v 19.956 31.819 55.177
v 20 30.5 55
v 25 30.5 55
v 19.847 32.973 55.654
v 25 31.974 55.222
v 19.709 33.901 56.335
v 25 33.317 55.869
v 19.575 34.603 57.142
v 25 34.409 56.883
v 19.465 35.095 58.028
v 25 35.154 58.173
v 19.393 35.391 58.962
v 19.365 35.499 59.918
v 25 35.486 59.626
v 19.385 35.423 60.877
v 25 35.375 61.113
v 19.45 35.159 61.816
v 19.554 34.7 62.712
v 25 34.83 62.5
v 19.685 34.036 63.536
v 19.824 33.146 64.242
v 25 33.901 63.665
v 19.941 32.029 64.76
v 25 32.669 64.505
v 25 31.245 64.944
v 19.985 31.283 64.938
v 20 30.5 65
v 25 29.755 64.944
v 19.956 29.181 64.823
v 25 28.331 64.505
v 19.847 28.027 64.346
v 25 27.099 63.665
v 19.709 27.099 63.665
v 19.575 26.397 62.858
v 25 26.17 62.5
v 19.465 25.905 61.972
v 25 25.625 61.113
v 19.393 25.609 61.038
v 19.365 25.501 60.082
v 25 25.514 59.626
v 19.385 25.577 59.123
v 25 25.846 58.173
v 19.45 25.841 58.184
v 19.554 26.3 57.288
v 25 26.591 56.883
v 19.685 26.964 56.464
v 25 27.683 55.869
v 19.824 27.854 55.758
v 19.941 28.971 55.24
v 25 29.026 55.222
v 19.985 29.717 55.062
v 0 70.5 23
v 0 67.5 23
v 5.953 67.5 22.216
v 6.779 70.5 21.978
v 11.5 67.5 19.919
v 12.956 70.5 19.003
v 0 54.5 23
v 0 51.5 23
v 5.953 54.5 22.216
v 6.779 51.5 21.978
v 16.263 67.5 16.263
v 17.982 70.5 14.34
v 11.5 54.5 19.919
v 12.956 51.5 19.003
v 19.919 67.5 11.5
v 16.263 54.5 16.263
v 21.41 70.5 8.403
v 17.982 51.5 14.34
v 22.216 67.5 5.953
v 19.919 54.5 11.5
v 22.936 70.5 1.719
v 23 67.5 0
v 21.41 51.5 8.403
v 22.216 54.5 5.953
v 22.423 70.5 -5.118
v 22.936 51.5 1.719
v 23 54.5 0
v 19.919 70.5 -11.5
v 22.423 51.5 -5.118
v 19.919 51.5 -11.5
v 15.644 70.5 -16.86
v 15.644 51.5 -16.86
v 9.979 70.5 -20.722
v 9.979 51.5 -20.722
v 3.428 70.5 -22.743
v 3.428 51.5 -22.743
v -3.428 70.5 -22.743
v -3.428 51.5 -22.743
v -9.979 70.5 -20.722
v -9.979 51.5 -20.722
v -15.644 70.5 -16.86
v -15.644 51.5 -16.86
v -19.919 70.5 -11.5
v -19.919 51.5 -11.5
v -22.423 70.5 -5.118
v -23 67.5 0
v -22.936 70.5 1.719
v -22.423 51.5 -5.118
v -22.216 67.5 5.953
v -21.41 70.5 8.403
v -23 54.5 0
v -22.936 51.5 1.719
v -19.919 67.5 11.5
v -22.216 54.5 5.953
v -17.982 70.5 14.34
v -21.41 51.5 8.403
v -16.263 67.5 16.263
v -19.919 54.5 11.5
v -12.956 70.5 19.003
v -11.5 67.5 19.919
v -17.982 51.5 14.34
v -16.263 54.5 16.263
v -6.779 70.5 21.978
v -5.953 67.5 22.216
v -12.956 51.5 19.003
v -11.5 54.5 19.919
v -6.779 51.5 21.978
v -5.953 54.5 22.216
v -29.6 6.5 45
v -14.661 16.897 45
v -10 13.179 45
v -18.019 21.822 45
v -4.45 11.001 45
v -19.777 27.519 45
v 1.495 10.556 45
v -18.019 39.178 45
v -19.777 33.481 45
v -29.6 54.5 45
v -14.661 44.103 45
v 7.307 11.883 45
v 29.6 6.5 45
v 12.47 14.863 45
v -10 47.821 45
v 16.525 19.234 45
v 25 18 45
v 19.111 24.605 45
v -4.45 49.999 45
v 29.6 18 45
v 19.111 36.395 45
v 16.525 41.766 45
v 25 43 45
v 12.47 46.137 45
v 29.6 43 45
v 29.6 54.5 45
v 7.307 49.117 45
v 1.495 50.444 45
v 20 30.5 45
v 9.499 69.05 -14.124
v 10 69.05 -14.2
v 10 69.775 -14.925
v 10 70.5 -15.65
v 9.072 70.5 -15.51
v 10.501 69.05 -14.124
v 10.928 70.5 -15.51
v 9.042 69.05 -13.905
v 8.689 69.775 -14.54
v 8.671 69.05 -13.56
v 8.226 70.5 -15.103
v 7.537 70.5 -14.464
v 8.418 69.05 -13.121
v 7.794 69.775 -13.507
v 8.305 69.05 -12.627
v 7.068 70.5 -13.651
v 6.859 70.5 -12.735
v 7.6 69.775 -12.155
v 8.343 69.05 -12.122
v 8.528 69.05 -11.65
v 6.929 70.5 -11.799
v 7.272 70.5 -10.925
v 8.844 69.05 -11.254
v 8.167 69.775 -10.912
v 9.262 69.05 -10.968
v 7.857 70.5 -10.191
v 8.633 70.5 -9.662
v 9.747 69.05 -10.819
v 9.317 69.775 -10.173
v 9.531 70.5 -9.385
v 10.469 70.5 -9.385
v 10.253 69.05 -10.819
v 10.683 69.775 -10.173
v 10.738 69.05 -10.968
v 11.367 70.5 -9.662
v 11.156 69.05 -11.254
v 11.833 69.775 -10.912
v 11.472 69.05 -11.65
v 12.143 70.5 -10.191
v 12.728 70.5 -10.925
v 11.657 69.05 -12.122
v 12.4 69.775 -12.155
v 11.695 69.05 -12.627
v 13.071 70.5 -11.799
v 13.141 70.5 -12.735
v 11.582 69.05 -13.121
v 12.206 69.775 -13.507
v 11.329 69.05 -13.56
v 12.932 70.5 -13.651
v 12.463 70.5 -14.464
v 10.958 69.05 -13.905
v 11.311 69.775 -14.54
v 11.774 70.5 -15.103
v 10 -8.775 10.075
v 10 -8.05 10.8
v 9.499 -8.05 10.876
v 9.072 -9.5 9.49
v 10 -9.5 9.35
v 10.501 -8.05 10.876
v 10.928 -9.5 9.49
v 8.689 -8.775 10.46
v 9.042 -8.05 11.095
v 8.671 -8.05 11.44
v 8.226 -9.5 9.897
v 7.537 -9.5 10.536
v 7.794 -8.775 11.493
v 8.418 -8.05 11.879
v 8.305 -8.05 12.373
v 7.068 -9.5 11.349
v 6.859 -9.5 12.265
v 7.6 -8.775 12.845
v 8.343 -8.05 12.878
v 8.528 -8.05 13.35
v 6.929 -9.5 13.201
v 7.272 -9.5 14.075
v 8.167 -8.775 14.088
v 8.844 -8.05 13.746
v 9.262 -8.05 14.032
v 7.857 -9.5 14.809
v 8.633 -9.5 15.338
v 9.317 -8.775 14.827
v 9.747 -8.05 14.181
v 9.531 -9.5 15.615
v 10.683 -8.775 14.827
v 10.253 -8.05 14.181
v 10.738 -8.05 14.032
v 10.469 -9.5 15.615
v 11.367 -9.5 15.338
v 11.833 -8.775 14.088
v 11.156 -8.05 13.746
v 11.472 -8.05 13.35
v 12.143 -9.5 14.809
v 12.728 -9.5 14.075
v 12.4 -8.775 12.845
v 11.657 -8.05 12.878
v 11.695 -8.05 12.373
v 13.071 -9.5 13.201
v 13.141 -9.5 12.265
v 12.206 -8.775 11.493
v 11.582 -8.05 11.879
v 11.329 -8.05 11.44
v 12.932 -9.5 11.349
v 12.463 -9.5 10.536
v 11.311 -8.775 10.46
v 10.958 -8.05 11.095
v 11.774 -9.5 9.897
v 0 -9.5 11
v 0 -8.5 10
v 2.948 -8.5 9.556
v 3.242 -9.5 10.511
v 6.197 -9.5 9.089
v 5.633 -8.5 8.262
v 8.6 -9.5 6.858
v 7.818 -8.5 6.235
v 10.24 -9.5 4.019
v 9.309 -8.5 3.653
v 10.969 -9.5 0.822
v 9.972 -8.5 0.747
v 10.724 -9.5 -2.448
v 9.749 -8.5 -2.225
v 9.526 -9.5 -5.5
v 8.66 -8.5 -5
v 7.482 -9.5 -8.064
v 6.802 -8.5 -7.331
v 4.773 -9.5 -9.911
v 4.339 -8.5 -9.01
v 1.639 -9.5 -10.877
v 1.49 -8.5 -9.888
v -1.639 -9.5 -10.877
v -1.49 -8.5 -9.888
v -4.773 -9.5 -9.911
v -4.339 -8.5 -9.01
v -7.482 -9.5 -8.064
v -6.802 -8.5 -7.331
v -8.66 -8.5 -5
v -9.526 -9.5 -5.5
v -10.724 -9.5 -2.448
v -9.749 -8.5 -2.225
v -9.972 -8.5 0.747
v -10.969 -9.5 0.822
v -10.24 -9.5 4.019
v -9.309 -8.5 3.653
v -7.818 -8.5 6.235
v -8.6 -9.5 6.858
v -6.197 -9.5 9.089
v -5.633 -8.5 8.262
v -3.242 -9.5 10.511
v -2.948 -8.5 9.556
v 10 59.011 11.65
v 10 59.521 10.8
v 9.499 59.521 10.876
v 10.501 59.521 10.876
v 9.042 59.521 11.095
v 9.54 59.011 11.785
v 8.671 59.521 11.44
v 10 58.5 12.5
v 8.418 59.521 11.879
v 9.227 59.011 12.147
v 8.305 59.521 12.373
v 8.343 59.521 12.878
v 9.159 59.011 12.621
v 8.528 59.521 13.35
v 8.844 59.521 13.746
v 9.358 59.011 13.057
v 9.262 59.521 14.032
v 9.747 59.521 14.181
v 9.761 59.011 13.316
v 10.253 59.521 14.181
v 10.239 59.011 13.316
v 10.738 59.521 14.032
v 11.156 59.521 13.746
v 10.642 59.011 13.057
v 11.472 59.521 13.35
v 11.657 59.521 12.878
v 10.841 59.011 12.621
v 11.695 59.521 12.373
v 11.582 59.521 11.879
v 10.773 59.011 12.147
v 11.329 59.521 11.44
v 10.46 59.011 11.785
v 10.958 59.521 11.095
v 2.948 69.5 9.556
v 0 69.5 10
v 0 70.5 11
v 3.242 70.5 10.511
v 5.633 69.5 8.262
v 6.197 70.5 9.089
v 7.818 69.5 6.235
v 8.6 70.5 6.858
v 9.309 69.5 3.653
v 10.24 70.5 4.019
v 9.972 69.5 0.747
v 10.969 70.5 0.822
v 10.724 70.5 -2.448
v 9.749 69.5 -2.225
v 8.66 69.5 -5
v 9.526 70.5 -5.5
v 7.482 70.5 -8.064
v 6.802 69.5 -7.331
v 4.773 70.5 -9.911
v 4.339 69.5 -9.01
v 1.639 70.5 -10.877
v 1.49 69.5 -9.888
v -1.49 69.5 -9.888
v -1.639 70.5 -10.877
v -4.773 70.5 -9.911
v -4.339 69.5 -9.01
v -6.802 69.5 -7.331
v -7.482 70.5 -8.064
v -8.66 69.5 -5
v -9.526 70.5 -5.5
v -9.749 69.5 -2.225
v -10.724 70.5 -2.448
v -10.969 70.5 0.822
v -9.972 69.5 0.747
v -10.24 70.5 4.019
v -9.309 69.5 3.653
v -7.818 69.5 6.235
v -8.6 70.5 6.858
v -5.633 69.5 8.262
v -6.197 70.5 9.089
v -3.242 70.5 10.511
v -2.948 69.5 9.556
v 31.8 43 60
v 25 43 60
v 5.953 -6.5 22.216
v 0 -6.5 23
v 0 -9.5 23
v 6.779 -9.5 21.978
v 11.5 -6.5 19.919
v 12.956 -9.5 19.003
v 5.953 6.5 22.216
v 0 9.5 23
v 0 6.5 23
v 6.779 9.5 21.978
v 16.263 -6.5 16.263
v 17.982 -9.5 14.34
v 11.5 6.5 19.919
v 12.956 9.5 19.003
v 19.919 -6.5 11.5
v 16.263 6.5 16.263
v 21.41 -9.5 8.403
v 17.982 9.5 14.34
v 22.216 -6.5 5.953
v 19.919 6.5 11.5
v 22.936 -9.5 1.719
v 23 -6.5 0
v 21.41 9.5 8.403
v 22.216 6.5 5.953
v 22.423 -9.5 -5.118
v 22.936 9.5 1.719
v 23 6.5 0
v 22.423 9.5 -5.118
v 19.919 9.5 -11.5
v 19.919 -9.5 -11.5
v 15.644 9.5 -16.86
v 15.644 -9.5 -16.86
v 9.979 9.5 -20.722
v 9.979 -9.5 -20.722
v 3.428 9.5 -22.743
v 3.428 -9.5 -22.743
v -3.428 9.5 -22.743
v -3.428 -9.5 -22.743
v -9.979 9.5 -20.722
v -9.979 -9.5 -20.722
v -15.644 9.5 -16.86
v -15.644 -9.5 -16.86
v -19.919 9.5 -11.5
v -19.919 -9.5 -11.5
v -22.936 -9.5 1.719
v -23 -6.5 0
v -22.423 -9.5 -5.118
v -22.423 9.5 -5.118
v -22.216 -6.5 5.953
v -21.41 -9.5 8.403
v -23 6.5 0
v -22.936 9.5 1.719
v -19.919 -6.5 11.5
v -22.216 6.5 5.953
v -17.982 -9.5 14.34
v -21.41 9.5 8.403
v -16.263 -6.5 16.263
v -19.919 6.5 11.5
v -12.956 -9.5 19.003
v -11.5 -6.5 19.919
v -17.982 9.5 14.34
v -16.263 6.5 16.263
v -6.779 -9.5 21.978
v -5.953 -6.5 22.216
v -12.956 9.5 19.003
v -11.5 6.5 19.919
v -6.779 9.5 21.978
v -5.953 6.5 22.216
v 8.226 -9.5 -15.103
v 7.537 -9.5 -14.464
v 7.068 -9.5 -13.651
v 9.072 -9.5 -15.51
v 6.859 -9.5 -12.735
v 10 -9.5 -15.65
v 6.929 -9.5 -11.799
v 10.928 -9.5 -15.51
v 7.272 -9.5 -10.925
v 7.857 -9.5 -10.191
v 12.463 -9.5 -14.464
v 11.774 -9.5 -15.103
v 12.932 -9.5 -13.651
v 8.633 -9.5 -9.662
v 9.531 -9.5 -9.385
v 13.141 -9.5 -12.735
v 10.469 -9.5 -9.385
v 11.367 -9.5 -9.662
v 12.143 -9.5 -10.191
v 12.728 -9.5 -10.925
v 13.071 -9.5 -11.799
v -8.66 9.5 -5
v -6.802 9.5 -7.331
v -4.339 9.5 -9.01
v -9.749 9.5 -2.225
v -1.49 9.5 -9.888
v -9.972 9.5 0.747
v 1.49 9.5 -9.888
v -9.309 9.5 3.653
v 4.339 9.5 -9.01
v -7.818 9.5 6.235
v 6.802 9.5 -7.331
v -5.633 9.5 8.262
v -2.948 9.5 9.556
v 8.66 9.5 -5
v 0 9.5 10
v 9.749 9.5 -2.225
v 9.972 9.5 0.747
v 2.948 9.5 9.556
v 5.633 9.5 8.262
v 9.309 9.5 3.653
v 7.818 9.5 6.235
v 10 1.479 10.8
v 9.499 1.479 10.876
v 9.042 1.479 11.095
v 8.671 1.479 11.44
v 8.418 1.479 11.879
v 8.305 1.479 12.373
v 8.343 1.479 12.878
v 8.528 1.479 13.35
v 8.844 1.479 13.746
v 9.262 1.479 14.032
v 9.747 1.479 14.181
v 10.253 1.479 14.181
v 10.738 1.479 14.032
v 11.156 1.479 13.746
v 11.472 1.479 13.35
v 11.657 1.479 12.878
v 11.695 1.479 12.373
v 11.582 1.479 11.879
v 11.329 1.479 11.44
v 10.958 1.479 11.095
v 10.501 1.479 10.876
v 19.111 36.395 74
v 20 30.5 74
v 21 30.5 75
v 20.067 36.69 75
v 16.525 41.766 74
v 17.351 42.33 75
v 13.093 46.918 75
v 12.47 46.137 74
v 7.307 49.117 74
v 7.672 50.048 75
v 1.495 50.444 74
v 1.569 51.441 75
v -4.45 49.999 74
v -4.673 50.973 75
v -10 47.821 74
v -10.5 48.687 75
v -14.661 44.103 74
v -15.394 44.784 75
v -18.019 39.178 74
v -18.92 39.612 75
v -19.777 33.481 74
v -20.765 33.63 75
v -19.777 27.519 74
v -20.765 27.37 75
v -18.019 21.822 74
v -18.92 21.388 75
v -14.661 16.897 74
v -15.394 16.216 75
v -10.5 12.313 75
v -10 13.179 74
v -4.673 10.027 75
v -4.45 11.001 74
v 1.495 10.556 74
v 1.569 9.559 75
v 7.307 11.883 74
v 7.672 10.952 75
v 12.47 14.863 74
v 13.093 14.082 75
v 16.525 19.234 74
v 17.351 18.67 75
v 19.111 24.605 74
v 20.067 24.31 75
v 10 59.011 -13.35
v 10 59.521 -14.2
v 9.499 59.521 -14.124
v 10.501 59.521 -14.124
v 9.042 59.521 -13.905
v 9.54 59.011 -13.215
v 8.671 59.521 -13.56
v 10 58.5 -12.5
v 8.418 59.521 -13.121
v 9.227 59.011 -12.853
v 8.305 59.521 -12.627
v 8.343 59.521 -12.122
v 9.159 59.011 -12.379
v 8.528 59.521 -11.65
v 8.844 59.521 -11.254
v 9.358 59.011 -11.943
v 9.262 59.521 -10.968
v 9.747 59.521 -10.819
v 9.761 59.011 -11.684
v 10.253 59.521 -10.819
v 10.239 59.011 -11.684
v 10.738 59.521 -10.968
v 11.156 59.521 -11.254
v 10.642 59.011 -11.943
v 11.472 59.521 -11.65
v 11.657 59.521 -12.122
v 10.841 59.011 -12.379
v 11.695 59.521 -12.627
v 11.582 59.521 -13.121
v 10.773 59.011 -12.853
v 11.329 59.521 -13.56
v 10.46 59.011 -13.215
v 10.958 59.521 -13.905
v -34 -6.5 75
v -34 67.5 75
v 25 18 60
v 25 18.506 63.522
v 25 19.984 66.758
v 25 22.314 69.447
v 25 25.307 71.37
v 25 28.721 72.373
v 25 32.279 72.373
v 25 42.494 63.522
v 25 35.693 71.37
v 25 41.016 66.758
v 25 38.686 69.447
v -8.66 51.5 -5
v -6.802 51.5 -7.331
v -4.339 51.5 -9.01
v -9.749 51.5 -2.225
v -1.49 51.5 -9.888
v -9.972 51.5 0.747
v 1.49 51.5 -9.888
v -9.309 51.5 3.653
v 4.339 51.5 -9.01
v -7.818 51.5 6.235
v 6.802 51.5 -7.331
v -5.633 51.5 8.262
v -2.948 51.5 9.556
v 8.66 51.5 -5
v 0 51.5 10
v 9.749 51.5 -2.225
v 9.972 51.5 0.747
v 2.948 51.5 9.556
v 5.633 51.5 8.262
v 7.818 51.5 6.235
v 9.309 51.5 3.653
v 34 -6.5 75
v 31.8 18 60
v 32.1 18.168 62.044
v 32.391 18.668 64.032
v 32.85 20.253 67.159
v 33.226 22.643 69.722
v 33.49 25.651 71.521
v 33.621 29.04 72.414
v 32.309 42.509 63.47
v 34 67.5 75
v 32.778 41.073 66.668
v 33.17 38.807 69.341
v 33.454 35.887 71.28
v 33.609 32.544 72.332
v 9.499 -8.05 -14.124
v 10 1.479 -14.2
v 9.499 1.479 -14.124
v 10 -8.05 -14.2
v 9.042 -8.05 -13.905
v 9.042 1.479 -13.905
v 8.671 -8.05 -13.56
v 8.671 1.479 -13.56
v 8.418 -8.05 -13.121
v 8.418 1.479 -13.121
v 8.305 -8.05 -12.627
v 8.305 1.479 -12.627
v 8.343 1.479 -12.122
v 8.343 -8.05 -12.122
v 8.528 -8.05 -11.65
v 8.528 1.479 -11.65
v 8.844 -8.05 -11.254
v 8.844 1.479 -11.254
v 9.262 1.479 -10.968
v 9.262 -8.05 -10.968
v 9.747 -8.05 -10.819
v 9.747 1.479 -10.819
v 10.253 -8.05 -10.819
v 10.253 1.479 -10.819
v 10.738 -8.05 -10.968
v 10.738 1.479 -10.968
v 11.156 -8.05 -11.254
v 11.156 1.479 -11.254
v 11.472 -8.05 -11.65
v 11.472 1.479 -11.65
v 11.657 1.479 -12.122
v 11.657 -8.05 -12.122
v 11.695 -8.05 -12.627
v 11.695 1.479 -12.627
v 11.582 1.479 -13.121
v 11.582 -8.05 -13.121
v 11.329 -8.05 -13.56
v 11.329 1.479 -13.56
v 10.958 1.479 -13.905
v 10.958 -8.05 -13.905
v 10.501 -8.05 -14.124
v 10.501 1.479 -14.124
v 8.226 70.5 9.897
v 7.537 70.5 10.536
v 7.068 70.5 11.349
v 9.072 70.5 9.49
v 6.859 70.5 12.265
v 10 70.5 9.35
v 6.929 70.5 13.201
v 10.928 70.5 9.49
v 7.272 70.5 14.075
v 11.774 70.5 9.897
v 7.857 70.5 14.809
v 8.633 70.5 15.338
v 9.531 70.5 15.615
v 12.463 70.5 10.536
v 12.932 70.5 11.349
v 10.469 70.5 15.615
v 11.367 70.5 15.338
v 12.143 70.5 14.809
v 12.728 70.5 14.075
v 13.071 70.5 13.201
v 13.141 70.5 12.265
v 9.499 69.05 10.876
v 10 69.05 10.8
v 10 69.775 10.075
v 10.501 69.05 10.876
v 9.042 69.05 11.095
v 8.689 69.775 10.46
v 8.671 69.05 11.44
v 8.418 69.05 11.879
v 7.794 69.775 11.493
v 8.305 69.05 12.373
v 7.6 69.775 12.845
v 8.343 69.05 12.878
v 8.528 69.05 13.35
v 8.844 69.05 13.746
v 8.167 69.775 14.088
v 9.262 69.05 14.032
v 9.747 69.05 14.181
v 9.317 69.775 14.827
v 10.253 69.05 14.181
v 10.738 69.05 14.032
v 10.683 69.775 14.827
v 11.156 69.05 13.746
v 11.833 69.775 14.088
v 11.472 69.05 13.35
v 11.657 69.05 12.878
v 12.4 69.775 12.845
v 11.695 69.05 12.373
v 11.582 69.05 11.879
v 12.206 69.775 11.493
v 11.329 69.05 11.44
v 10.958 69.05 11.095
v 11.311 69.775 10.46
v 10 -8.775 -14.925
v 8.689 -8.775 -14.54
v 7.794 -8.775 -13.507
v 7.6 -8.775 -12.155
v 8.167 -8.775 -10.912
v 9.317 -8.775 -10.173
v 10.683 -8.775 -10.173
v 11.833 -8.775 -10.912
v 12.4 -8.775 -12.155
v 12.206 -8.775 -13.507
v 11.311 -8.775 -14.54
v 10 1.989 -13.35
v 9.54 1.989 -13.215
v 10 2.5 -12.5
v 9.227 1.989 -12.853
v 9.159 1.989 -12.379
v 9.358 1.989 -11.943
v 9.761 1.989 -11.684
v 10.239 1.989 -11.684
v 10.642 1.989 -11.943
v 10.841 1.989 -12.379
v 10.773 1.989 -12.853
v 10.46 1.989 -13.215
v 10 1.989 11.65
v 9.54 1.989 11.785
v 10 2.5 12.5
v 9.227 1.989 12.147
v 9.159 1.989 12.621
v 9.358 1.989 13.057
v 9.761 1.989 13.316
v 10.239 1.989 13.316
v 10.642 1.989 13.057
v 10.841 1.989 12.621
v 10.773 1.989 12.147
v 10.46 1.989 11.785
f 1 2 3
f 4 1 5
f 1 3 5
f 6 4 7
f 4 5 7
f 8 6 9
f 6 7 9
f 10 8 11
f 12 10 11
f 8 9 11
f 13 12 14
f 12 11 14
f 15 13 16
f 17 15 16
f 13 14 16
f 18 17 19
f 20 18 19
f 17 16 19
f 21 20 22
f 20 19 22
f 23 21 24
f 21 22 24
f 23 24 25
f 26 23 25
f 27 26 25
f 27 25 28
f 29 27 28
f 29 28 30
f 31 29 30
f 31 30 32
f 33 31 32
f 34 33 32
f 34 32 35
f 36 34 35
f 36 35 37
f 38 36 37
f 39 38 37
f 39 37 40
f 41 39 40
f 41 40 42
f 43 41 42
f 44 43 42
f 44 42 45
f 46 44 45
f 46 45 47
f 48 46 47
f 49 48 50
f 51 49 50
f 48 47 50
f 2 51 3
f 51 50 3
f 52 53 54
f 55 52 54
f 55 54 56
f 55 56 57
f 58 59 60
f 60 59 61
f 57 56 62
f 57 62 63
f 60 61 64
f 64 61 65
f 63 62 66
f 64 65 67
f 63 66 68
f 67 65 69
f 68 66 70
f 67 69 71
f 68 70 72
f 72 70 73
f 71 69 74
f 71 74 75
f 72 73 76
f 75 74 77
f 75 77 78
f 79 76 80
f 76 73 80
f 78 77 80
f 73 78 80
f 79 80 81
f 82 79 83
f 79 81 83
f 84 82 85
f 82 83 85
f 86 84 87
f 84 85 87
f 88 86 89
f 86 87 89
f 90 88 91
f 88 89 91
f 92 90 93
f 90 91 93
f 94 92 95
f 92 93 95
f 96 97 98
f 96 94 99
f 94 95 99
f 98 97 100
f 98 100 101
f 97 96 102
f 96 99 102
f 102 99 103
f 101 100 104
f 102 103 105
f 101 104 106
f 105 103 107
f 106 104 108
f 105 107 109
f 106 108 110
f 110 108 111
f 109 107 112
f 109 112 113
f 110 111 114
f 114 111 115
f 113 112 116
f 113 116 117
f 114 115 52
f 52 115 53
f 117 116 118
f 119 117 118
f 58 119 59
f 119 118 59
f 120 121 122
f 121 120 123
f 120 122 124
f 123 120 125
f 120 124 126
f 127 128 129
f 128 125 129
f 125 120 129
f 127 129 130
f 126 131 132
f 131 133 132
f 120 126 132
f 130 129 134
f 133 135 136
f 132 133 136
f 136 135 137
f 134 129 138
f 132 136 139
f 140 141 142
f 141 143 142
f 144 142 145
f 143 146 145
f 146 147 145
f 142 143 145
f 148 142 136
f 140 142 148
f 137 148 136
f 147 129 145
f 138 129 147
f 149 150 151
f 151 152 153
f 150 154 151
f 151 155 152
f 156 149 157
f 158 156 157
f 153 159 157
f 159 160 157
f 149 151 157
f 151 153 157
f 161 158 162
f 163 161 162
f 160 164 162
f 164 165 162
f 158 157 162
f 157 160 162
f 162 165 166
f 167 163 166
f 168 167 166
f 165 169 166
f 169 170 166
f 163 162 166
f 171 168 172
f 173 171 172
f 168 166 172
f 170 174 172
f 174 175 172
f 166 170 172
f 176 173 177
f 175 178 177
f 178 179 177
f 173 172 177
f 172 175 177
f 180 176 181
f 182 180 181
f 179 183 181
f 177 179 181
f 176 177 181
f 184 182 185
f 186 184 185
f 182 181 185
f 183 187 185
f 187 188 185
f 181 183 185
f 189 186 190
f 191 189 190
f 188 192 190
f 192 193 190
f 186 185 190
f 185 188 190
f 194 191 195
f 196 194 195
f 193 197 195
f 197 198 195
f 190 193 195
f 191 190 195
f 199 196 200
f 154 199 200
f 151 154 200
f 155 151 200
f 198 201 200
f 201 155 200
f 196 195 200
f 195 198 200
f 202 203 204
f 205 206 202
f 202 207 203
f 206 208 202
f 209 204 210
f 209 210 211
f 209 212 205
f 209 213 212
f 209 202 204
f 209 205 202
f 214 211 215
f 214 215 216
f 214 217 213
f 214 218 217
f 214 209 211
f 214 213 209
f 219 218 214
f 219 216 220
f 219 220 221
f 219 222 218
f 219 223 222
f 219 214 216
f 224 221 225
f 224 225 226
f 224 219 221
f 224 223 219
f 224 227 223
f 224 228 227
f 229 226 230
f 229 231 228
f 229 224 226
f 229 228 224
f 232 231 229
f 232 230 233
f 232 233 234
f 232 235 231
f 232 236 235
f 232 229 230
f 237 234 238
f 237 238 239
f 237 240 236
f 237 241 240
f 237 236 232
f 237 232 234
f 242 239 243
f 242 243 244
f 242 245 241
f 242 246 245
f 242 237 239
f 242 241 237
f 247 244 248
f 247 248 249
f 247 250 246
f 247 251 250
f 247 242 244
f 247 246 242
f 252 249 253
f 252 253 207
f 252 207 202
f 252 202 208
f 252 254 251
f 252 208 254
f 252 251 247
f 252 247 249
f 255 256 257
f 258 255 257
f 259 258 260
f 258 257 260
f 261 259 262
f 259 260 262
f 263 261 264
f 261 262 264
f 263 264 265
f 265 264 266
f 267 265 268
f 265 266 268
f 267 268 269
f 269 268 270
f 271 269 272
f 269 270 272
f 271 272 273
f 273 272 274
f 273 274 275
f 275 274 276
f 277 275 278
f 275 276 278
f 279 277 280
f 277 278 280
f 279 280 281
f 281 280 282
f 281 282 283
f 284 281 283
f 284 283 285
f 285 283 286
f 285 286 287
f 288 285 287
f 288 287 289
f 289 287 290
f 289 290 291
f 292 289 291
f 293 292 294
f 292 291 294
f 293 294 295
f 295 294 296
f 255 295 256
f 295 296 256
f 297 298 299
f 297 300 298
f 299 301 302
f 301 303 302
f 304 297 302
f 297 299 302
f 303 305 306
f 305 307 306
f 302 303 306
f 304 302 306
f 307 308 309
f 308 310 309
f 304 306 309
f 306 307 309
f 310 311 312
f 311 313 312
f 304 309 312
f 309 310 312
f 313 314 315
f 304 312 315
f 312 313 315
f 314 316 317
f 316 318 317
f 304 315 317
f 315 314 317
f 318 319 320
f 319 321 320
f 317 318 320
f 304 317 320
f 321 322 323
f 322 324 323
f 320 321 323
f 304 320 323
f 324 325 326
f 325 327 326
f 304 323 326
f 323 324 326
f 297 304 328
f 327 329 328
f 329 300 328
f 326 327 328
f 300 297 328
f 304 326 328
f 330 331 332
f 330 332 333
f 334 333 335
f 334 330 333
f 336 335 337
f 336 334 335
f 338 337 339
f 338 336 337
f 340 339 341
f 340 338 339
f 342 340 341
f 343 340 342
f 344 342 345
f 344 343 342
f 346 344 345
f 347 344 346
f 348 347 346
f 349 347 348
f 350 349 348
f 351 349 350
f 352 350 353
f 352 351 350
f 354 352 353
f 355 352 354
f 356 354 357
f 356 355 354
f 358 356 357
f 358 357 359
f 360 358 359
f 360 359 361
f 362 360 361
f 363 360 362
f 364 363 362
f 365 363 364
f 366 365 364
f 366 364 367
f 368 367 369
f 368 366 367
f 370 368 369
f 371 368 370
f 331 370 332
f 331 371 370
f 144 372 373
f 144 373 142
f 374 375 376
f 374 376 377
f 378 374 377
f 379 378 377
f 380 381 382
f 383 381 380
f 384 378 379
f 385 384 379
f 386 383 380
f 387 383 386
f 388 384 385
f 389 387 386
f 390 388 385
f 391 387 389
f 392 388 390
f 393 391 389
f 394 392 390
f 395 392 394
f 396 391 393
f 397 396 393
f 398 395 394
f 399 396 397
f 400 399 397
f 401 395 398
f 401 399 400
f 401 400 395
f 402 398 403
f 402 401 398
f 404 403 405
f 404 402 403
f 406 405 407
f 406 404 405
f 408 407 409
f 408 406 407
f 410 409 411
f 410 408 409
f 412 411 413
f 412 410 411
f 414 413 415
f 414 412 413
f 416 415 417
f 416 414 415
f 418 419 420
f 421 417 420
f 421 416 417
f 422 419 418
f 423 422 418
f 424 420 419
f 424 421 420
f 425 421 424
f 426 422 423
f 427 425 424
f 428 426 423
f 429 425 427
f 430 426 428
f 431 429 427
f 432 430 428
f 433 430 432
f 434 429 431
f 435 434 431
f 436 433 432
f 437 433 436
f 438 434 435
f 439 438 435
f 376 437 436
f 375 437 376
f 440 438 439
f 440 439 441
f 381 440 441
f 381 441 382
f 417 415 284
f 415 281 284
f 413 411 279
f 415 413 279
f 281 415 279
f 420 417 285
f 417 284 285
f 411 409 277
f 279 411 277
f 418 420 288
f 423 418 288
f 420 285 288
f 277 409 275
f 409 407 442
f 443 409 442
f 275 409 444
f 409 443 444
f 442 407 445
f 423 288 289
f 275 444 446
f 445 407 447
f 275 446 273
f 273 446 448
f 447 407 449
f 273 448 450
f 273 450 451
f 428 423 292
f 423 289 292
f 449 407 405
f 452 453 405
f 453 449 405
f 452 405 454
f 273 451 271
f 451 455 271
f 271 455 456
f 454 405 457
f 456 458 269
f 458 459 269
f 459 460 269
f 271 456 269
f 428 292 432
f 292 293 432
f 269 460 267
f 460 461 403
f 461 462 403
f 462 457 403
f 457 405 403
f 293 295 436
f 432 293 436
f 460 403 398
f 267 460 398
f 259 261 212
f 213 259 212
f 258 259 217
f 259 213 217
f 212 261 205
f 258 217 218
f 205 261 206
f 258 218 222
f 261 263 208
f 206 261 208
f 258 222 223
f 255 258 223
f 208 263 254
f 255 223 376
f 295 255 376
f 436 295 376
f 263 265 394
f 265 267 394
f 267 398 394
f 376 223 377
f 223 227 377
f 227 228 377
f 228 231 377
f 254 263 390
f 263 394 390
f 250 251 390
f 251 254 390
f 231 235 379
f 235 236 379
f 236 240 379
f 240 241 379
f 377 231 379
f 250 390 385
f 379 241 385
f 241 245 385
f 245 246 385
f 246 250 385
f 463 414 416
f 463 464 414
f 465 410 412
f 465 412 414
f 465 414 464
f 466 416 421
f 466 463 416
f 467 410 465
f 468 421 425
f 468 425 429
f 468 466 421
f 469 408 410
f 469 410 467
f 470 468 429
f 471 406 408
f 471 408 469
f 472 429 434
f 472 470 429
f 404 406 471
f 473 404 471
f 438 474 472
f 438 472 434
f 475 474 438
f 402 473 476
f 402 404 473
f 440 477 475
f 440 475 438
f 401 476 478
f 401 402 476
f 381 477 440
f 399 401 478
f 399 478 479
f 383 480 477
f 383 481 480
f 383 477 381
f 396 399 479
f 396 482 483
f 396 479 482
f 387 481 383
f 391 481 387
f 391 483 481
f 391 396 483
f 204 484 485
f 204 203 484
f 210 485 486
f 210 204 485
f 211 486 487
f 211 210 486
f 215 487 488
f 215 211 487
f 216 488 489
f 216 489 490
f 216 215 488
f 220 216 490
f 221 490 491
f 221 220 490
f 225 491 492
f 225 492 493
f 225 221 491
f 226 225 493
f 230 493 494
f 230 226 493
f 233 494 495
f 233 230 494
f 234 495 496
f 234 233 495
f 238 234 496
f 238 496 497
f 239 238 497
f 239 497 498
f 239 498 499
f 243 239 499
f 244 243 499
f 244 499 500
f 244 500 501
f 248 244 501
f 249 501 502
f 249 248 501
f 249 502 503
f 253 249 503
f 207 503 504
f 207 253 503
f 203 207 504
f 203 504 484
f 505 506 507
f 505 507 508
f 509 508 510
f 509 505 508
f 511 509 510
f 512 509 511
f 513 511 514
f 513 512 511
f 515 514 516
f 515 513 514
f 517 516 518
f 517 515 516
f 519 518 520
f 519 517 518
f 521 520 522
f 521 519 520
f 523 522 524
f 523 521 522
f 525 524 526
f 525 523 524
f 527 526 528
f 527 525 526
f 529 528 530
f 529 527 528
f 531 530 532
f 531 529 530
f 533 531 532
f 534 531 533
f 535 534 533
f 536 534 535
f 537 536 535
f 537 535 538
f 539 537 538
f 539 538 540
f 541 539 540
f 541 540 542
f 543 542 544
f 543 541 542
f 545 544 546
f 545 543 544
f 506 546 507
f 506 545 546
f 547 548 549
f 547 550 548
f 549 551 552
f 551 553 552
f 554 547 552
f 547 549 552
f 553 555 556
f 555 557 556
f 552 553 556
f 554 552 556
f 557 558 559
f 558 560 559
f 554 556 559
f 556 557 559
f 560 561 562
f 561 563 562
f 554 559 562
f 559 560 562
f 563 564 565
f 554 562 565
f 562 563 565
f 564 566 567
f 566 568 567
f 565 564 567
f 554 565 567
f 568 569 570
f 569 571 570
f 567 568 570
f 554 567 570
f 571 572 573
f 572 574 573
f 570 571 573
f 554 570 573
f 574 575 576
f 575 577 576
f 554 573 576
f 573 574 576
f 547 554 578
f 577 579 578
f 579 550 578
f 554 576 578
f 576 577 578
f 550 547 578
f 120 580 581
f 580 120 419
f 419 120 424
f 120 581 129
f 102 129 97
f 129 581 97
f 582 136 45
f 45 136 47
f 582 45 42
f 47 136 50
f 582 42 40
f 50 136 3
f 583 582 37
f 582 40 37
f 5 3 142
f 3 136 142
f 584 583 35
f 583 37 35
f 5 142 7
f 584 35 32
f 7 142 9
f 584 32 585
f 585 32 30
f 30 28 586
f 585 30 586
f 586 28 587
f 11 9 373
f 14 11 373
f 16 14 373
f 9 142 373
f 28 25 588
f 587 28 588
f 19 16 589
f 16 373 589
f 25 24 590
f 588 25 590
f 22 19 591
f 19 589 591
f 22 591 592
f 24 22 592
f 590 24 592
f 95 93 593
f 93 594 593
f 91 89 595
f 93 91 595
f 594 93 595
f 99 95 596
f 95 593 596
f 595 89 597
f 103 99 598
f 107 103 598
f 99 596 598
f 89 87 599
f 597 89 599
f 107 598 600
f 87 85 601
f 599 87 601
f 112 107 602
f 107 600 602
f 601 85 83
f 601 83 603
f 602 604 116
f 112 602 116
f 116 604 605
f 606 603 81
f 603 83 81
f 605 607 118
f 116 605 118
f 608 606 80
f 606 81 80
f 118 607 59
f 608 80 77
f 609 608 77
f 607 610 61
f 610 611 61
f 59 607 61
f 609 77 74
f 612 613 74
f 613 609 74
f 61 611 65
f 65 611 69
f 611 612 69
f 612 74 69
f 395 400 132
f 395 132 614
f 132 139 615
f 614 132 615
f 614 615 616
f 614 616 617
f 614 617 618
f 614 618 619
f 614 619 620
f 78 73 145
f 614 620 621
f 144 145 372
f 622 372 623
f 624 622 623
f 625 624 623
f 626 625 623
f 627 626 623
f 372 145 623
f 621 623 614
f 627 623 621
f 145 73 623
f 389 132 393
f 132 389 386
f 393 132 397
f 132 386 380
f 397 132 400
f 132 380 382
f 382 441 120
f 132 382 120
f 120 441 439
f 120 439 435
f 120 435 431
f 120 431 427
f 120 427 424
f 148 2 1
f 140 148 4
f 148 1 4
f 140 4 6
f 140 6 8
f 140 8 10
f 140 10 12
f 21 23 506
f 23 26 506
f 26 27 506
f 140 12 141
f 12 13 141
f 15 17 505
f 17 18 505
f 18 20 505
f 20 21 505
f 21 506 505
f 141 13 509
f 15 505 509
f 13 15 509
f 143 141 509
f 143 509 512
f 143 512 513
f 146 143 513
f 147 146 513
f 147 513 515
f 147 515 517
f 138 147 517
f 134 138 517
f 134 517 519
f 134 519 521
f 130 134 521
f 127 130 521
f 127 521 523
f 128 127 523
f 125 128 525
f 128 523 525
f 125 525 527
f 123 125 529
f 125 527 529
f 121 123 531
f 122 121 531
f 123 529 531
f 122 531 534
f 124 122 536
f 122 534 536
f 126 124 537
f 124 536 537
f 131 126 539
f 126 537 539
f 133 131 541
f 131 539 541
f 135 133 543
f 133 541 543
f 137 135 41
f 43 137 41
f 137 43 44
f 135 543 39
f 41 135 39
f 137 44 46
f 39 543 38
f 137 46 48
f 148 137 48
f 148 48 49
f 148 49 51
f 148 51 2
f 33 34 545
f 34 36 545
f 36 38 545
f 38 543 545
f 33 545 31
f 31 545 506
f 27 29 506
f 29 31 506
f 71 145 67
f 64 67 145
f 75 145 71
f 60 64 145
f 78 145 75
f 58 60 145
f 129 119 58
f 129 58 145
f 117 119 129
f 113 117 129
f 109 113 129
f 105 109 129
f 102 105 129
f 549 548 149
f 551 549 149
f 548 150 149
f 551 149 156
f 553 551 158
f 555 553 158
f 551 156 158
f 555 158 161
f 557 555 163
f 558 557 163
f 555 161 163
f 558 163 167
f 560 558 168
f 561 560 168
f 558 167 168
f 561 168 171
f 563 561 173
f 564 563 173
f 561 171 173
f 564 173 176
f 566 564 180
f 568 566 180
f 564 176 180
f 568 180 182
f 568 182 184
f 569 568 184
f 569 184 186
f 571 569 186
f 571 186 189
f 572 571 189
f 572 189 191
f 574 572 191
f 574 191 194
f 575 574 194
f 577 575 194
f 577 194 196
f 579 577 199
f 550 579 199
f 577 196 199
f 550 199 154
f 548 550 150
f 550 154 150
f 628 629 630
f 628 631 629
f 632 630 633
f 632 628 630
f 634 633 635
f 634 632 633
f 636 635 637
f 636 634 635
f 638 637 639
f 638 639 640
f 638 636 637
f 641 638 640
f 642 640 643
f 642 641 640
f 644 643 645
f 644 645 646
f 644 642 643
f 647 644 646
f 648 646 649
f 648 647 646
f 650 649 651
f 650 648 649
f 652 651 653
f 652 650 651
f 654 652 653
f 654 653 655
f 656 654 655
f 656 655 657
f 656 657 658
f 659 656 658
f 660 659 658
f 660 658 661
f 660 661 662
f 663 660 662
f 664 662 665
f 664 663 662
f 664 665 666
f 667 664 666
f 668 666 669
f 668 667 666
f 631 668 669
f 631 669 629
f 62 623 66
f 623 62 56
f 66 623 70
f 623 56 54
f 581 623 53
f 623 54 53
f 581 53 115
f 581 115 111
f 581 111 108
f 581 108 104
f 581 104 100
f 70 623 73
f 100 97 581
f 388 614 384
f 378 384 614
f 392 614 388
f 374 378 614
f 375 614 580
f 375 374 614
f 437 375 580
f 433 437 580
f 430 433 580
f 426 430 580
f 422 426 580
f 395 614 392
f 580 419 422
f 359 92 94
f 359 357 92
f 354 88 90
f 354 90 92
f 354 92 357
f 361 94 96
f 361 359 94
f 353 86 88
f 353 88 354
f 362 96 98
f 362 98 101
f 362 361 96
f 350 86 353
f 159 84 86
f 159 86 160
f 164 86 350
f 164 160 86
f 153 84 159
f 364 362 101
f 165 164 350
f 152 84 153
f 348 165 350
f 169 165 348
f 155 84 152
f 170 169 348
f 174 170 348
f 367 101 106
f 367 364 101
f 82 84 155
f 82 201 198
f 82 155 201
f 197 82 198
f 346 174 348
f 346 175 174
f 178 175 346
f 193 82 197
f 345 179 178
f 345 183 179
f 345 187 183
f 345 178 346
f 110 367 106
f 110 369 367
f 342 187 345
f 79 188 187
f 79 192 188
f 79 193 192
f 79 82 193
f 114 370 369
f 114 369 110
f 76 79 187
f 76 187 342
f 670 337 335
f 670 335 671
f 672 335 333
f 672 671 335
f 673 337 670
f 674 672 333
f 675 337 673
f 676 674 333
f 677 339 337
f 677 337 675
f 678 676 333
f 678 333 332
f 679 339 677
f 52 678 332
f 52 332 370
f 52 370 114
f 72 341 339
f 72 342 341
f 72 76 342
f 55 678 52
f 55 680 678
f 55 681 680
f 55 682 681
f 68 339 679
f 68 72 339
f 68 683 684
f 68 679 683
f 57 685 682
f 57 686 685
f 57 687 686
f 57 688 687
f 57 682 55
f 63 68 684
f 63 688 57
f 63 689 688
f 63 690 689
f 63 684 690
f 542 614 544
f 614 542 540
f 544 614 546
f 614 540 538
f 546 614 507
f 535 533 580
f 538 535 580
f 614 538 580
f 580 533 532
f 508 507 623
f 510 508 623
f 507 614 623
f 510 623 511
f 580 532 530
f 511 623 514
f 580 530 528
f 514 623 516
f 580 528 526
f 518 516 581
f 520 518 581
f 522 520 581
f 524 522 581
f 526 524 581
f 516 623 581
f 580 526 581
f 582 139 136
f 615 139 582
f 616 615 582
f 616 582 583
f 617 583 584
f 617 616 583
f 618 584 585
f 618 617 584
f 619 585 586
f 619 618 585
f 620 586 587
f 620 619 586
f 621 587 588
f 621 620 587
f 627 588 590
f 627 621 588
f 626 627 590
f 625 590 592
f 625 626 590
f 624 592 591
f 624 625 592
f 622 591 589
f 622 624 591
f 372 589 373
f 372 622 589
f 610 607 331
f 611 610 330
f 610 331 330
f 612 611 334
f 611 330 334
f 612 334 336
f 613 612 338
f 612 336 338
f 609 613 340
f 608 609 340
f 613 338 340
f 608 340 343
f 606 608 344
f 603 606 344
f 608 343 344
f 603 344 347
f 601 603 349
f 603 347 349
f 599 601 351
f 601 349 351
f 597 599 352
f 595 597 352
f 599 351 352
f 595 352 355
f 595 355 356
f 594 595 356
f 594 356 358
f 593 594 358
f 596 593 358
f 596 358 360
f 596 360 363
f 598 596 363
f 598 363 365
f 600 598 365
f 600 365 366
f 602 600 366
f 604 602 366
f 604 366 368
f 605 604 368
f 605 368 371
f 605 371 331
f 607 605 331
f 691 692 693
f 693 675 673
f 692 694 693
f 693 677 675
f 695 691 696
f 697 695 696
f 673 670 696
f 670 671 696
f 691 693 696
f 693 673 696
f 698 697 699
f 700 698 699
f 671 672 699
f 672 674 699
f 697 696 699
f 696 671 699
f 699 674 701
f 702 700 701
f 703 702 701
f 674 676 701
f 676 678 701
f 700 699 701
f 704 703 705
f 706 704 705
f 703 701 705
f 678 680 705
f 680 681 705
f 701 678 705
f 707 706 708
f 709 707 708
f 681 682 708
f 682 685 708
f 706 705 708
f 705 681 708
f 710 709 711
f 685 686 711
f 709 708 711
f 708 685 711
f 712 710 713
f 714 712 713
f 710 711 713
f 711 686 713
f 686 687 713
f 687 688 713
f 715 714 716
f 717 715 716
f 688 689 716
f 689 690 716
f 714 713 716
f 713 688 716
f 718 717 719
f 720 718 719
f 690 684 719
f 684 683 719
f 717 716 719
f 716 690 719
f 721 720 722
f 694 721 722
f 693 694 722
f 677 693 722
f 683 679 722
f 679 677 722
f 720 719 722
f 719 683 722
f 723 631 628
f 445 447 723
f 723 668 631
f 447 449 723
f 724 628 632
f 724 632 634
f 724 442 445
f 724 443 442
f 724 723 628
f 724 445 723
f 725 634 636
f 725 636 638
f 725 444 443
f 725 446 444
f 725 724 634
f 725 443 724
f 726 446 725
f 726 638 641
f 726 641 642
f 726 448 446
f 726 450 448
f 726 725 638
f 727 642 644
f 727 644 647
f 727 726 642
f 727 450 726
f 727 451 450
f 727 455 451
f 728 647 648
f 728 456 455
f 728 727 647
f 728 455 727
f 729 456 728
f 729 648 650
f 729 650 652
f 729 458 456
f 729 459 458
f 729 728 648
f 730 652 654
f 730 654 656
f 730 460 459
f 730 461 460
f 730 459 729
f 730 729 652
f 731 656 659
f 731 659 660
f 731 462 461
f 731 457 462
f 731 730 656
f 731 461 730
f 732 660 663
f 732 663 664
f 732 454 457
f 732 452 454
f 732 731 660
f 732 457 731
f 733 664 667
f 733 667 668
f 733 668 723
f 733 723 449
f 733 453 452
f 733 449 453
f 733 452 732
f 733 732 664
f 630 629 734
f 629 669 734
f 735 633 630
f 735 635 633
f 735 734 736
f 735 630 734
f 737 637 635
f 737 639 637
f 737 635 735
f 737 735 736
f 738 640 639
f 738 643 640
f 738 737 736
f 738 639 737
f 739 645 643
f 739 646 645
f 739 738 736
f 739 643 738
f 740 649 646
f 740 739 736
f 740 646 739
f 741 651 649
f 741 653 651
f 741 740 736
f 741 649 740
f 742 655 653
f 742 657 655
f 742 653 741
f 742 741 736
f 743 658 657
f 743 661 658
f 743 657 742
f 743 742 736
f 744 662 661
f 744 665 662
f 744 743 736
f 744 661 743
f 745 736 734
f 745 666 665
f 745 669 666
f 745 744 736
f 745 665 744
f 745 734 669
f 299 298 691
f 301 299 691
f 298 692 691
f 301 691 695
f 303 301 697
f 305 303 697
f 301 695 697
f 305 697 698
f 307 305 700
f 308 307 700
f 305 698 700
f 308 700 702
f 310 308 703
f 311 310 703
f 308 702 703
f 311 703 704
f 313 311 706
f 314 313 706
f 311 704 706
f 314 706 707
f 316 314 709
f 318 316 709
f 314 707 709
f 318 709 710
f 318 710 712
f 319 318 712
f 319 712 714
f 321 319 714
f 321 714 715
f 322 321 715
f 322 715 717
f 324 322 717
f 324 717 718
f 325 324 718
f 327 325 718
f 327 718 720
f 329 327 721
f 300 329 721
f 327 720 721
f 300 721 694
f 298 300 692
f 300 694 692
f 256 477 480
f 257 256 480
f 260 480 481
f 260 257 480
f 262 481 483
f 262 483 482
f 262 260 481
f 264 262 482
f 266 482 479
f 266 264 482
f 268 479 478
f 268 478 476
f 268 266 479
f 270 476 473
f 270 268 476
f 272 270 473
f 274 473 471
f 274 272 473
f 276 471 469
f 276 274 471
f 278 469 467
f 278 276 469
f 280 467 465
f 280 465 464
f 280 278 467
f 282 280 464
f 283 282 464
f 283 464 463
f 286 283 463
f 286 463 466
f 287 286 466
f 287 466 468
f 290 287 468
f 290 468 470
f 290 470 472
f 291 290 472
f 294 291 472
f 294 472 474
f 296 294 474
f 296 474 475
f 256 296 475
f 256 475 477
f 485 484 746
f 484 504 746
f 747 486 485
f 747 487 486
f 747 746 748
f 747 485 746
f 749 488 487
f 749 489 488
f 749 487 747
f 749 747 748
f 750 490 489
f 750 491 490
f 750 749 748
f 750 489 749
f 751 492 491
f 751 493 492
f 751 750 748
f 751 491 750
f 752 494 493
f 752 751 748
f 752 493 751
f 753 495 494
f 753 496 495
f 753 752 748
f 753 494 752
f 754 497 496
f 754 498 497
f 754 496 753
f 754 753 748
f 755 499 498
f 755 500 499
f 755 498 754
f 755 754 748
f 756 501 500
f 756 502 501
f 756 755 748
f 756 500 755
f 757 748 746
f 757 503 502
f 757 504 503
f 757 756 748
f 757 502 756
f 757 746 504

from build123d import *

# Parameters (mm, degrees)
BOSS_EXTRUDE2_DEPTH                          = 6.5
SKETCH2_R                                    = 23
SKETCH2_R_2                                  = 10
BOSS_EXTRUDE3_DEPTH                          = 9.5
BOSS_EXTRUDE4_DEPTH                          = 24
CHAMFER2_SIZE                                = 1
CSK_FOR_M3_COUNTERSUNK_RAISED_HEAD_S_2_COUNT = 2
CSK_FOR_M3_COUNTERSUNK_RAISED_HEAD_S_2_PITCH = 25
CHAMFER2_OF_MIRROR4_SIZE                     = 1
SKETCH4_R                                    = 20
CUT_EXTRUDE1_DEPTH                           = 126.420293414
CUT_EXTRUDE2_DEPTH                           = 9
CUT_EXTRUDE3_REACH                           = 125.366
CUT_EXTRUDE3_END_RADIUS                      = 20
SKETCH6_5_R                                  = 5
CHAMFER3_SIZE                                = 1


with BuildPart() as part:
    # Sketch1 → Boss-Extrude2 (new, symmetric)
    with BuildSketch(Plane(origin=(0, 0, 0), x_dir=(1, 0, 0), z_dir=(0, 1, 0))):
        with BuildLine():
            ThreePointArc((-23, 0), (0, -23), (23, 0))
            Line((23, 0), (34, -75))
            Line((34, -75), (-34, -75))
            Line((-34, -75), (-23, 0))
        make_face()
    boss_extrude2 = extrude(amount=BOSS_EXTRUDE2_DEPTH, both=True)

    # Sketch2 → Boss-Extrude3 (add, symmetric)
    with BuildSketch(Plane(origin=(0, 0, 0), x_dir=(1, 0, 0), z_dir=(0, 1, 0))):
        with Locations(Location((0, 0, 0), (0, 0, 270))):
            Circle(SKETCH2_R)
        with Locations(Location((0, 0, 0), (0, 0, 270))):
            Circle(SKETCH2_R_2, mode=Mode.SUBTRACT)
    boss_extrude3 = extrude(amount=BOSS_EXTRUDE3_DEPTH, both=True)

    # Sketch3 → Boss-Extrude4 (add)
    with BuildSketch(Plane(origin=(0, 6.5, 0), x_dir=(1, 0, 0), z_dir=(0, 1, 0))):
        Polygon((-29.6, -45), (29.6, -45), (34, -75), (-34, -75), align=None)
    boss_extrude4 = extrude(amount=BOSS_EXTRUDE4_DEPTH)

    # Chamfer2
    chamfer2_edges = [part.edges().sort_by_distance(p)[0] for p in [
        (0, -9.5, -10),
    ]]
    chamfer(chamfer2_edges, length=CHAMFER2_SIZE)

    # Sketch12 → CSK for M3 Countersunk Raised Head Screw2 (revolve, cut)
    with BuildSketch(Plane(origin=(10, -9.5, -12.5), x_dir=(0, 0, -1), z_dir=(1, 0, 0))):
        Polygon((0, 0), (0, 12), (1.7, 10.978536948), (1.7, 1.45), (3.15, 0), align=None)
    csk_for_m3_countersunk_raised_head_screw = revolve(axis=Axis((10, -15.85, -12.5), (0, 1, 0)), mode=Mode.SUBTRACT)

    # CSK for M3 Countersunk Raised Head S 2: CSK for M3 Countersunk Raised Head Screw2 ×2
    with Locations(*[(0, 0, i * CSK_FOR_M3_COUNTERSUNK_RAISED_HEAD_S_2_PITCH) for i in range(1, CSK_FOR_M3_COUNTERSUNK_RAISED_HEAD_S_2_COUNT)]):
        add(csk_for_m3_countersunk_raised_head_screw, mode=Mode.SUBTRACT)

    # Mirror4: Boss-Extrude2, Boss-Extrude3, Boss-Extrude4, CSK for M3 Countersunk Raised Head Screw2 across plane
    add(boss_extrude2.mirror(Plane.ZX.offset(30.5)))
    add(boss_extrude3.mirror(Plane.ZX.offset(30.5)))
    add(boss_extrude4.mirror(Plane.ZX.offset(30.5)))
    add(csk_for_m3_countersunk_raised_head_screw.mirror(Plane.ZX.offset(30.5)), mode=Mode.SUBTRACT)

    # Mirror4 copy 1 sketch → Mirror4 copy 1 (revolve, cut)
    with BuildSketch(Plane(origin=(10, 70.5, 12.5), x_dir=(0, 0, -1), z_dir=(1, 0, 0))):
        Polygon((0, 0), (0, -12), (1.7, -10.978536948), (1.7, -1.45), (3.15, 0), align=None)
    revolve(axis=Axis((10, 76.85, 12.5), (0, 1, 0)), mode=Mode.SUBTRACT)

    # Chamfer2 of Mirror4
    chamfer2_of_mirror4_edges = [part.edges().sort_by_distance(p)[0] for p in [
        (0, 70.5, -10),
    ]]
    chamfer(chamfer2_of_mirror4_edges, length=CHAMFER2_OF_MIRROR4_SIZE)

    # Sketch4 → Cut-Extrude1 (cut, through all)
    with BuildSketch(Plane.XY.offset(75)):
        with Locations((0, 30.5)):
            Circle(SKETCH4_R)
    extrude(amount=-CUT_EXTRUDE1_DEPTH, mode=Mode.SUBTRACT)

    # Sketch6 → Cut-Extrude2 (cut)
    with BuildSketch(Plane(origin=(34, 0, 0), x_dir=(0, 0, -1), z_dir=(1, 0, 0))):
        with BuildLine():
            Line((-60, 43), (-45, 43))
            Line((-45, 43), (-45, 18))
            Line((-45, 18), (-60, 18))
            ThreePointArc((-60, 18), (-72.5, 30.5), (-60, 43))
        make_face()
    extrude(amount=-CUT_EXTRUDE2_DEPTH, mode=Mode.SUBTRACT)

    # Cut-Extrude3: up to this cylinder (the profile starts outside it)
    cut_extrude3_end = Plane(origin=(0, 30.5, 60), z_dir=(0, 0, 1)) * Cylinder(CUT_EXTRUDE3_END_RADIUS, 291.732, mode=Mode.PRIVATE)
    # Sketch6<5> → Cut-Extrude3 (cut, up to the surface)
    with BuildSketch(Plane(origin=(34, 0, 0), x_dir=(0, 0, -1), z_dir=(1, 0, 0)), mode=Mode.PRIVATE) as cut_extrude3_sk1:
        with Locations((-60, 30.5)):
            Circle(SKETCH6_5_R)
    cut_extrude3_tool1 = extrude(cut_extrude3_sk1.sketch, amount=-CUT_EXTRUDE3_REACH, mode=Mode.PRIVATE) - cut_extrude3_end
    add(cut_extrude3_tool1.solids().sort_by_distance((34, 30.5, 60))[0], mode=Mode.SUBTRACT)

    # Chamfer3
    chamfer3_edges = [part.edges().sort_by_distance(p)[0] for p in [
        (-20, 30.5, 75),
    ]]
    chamfer(chamfer3_edges, length=CHAMFER3_SIZE)


solid = part.part
